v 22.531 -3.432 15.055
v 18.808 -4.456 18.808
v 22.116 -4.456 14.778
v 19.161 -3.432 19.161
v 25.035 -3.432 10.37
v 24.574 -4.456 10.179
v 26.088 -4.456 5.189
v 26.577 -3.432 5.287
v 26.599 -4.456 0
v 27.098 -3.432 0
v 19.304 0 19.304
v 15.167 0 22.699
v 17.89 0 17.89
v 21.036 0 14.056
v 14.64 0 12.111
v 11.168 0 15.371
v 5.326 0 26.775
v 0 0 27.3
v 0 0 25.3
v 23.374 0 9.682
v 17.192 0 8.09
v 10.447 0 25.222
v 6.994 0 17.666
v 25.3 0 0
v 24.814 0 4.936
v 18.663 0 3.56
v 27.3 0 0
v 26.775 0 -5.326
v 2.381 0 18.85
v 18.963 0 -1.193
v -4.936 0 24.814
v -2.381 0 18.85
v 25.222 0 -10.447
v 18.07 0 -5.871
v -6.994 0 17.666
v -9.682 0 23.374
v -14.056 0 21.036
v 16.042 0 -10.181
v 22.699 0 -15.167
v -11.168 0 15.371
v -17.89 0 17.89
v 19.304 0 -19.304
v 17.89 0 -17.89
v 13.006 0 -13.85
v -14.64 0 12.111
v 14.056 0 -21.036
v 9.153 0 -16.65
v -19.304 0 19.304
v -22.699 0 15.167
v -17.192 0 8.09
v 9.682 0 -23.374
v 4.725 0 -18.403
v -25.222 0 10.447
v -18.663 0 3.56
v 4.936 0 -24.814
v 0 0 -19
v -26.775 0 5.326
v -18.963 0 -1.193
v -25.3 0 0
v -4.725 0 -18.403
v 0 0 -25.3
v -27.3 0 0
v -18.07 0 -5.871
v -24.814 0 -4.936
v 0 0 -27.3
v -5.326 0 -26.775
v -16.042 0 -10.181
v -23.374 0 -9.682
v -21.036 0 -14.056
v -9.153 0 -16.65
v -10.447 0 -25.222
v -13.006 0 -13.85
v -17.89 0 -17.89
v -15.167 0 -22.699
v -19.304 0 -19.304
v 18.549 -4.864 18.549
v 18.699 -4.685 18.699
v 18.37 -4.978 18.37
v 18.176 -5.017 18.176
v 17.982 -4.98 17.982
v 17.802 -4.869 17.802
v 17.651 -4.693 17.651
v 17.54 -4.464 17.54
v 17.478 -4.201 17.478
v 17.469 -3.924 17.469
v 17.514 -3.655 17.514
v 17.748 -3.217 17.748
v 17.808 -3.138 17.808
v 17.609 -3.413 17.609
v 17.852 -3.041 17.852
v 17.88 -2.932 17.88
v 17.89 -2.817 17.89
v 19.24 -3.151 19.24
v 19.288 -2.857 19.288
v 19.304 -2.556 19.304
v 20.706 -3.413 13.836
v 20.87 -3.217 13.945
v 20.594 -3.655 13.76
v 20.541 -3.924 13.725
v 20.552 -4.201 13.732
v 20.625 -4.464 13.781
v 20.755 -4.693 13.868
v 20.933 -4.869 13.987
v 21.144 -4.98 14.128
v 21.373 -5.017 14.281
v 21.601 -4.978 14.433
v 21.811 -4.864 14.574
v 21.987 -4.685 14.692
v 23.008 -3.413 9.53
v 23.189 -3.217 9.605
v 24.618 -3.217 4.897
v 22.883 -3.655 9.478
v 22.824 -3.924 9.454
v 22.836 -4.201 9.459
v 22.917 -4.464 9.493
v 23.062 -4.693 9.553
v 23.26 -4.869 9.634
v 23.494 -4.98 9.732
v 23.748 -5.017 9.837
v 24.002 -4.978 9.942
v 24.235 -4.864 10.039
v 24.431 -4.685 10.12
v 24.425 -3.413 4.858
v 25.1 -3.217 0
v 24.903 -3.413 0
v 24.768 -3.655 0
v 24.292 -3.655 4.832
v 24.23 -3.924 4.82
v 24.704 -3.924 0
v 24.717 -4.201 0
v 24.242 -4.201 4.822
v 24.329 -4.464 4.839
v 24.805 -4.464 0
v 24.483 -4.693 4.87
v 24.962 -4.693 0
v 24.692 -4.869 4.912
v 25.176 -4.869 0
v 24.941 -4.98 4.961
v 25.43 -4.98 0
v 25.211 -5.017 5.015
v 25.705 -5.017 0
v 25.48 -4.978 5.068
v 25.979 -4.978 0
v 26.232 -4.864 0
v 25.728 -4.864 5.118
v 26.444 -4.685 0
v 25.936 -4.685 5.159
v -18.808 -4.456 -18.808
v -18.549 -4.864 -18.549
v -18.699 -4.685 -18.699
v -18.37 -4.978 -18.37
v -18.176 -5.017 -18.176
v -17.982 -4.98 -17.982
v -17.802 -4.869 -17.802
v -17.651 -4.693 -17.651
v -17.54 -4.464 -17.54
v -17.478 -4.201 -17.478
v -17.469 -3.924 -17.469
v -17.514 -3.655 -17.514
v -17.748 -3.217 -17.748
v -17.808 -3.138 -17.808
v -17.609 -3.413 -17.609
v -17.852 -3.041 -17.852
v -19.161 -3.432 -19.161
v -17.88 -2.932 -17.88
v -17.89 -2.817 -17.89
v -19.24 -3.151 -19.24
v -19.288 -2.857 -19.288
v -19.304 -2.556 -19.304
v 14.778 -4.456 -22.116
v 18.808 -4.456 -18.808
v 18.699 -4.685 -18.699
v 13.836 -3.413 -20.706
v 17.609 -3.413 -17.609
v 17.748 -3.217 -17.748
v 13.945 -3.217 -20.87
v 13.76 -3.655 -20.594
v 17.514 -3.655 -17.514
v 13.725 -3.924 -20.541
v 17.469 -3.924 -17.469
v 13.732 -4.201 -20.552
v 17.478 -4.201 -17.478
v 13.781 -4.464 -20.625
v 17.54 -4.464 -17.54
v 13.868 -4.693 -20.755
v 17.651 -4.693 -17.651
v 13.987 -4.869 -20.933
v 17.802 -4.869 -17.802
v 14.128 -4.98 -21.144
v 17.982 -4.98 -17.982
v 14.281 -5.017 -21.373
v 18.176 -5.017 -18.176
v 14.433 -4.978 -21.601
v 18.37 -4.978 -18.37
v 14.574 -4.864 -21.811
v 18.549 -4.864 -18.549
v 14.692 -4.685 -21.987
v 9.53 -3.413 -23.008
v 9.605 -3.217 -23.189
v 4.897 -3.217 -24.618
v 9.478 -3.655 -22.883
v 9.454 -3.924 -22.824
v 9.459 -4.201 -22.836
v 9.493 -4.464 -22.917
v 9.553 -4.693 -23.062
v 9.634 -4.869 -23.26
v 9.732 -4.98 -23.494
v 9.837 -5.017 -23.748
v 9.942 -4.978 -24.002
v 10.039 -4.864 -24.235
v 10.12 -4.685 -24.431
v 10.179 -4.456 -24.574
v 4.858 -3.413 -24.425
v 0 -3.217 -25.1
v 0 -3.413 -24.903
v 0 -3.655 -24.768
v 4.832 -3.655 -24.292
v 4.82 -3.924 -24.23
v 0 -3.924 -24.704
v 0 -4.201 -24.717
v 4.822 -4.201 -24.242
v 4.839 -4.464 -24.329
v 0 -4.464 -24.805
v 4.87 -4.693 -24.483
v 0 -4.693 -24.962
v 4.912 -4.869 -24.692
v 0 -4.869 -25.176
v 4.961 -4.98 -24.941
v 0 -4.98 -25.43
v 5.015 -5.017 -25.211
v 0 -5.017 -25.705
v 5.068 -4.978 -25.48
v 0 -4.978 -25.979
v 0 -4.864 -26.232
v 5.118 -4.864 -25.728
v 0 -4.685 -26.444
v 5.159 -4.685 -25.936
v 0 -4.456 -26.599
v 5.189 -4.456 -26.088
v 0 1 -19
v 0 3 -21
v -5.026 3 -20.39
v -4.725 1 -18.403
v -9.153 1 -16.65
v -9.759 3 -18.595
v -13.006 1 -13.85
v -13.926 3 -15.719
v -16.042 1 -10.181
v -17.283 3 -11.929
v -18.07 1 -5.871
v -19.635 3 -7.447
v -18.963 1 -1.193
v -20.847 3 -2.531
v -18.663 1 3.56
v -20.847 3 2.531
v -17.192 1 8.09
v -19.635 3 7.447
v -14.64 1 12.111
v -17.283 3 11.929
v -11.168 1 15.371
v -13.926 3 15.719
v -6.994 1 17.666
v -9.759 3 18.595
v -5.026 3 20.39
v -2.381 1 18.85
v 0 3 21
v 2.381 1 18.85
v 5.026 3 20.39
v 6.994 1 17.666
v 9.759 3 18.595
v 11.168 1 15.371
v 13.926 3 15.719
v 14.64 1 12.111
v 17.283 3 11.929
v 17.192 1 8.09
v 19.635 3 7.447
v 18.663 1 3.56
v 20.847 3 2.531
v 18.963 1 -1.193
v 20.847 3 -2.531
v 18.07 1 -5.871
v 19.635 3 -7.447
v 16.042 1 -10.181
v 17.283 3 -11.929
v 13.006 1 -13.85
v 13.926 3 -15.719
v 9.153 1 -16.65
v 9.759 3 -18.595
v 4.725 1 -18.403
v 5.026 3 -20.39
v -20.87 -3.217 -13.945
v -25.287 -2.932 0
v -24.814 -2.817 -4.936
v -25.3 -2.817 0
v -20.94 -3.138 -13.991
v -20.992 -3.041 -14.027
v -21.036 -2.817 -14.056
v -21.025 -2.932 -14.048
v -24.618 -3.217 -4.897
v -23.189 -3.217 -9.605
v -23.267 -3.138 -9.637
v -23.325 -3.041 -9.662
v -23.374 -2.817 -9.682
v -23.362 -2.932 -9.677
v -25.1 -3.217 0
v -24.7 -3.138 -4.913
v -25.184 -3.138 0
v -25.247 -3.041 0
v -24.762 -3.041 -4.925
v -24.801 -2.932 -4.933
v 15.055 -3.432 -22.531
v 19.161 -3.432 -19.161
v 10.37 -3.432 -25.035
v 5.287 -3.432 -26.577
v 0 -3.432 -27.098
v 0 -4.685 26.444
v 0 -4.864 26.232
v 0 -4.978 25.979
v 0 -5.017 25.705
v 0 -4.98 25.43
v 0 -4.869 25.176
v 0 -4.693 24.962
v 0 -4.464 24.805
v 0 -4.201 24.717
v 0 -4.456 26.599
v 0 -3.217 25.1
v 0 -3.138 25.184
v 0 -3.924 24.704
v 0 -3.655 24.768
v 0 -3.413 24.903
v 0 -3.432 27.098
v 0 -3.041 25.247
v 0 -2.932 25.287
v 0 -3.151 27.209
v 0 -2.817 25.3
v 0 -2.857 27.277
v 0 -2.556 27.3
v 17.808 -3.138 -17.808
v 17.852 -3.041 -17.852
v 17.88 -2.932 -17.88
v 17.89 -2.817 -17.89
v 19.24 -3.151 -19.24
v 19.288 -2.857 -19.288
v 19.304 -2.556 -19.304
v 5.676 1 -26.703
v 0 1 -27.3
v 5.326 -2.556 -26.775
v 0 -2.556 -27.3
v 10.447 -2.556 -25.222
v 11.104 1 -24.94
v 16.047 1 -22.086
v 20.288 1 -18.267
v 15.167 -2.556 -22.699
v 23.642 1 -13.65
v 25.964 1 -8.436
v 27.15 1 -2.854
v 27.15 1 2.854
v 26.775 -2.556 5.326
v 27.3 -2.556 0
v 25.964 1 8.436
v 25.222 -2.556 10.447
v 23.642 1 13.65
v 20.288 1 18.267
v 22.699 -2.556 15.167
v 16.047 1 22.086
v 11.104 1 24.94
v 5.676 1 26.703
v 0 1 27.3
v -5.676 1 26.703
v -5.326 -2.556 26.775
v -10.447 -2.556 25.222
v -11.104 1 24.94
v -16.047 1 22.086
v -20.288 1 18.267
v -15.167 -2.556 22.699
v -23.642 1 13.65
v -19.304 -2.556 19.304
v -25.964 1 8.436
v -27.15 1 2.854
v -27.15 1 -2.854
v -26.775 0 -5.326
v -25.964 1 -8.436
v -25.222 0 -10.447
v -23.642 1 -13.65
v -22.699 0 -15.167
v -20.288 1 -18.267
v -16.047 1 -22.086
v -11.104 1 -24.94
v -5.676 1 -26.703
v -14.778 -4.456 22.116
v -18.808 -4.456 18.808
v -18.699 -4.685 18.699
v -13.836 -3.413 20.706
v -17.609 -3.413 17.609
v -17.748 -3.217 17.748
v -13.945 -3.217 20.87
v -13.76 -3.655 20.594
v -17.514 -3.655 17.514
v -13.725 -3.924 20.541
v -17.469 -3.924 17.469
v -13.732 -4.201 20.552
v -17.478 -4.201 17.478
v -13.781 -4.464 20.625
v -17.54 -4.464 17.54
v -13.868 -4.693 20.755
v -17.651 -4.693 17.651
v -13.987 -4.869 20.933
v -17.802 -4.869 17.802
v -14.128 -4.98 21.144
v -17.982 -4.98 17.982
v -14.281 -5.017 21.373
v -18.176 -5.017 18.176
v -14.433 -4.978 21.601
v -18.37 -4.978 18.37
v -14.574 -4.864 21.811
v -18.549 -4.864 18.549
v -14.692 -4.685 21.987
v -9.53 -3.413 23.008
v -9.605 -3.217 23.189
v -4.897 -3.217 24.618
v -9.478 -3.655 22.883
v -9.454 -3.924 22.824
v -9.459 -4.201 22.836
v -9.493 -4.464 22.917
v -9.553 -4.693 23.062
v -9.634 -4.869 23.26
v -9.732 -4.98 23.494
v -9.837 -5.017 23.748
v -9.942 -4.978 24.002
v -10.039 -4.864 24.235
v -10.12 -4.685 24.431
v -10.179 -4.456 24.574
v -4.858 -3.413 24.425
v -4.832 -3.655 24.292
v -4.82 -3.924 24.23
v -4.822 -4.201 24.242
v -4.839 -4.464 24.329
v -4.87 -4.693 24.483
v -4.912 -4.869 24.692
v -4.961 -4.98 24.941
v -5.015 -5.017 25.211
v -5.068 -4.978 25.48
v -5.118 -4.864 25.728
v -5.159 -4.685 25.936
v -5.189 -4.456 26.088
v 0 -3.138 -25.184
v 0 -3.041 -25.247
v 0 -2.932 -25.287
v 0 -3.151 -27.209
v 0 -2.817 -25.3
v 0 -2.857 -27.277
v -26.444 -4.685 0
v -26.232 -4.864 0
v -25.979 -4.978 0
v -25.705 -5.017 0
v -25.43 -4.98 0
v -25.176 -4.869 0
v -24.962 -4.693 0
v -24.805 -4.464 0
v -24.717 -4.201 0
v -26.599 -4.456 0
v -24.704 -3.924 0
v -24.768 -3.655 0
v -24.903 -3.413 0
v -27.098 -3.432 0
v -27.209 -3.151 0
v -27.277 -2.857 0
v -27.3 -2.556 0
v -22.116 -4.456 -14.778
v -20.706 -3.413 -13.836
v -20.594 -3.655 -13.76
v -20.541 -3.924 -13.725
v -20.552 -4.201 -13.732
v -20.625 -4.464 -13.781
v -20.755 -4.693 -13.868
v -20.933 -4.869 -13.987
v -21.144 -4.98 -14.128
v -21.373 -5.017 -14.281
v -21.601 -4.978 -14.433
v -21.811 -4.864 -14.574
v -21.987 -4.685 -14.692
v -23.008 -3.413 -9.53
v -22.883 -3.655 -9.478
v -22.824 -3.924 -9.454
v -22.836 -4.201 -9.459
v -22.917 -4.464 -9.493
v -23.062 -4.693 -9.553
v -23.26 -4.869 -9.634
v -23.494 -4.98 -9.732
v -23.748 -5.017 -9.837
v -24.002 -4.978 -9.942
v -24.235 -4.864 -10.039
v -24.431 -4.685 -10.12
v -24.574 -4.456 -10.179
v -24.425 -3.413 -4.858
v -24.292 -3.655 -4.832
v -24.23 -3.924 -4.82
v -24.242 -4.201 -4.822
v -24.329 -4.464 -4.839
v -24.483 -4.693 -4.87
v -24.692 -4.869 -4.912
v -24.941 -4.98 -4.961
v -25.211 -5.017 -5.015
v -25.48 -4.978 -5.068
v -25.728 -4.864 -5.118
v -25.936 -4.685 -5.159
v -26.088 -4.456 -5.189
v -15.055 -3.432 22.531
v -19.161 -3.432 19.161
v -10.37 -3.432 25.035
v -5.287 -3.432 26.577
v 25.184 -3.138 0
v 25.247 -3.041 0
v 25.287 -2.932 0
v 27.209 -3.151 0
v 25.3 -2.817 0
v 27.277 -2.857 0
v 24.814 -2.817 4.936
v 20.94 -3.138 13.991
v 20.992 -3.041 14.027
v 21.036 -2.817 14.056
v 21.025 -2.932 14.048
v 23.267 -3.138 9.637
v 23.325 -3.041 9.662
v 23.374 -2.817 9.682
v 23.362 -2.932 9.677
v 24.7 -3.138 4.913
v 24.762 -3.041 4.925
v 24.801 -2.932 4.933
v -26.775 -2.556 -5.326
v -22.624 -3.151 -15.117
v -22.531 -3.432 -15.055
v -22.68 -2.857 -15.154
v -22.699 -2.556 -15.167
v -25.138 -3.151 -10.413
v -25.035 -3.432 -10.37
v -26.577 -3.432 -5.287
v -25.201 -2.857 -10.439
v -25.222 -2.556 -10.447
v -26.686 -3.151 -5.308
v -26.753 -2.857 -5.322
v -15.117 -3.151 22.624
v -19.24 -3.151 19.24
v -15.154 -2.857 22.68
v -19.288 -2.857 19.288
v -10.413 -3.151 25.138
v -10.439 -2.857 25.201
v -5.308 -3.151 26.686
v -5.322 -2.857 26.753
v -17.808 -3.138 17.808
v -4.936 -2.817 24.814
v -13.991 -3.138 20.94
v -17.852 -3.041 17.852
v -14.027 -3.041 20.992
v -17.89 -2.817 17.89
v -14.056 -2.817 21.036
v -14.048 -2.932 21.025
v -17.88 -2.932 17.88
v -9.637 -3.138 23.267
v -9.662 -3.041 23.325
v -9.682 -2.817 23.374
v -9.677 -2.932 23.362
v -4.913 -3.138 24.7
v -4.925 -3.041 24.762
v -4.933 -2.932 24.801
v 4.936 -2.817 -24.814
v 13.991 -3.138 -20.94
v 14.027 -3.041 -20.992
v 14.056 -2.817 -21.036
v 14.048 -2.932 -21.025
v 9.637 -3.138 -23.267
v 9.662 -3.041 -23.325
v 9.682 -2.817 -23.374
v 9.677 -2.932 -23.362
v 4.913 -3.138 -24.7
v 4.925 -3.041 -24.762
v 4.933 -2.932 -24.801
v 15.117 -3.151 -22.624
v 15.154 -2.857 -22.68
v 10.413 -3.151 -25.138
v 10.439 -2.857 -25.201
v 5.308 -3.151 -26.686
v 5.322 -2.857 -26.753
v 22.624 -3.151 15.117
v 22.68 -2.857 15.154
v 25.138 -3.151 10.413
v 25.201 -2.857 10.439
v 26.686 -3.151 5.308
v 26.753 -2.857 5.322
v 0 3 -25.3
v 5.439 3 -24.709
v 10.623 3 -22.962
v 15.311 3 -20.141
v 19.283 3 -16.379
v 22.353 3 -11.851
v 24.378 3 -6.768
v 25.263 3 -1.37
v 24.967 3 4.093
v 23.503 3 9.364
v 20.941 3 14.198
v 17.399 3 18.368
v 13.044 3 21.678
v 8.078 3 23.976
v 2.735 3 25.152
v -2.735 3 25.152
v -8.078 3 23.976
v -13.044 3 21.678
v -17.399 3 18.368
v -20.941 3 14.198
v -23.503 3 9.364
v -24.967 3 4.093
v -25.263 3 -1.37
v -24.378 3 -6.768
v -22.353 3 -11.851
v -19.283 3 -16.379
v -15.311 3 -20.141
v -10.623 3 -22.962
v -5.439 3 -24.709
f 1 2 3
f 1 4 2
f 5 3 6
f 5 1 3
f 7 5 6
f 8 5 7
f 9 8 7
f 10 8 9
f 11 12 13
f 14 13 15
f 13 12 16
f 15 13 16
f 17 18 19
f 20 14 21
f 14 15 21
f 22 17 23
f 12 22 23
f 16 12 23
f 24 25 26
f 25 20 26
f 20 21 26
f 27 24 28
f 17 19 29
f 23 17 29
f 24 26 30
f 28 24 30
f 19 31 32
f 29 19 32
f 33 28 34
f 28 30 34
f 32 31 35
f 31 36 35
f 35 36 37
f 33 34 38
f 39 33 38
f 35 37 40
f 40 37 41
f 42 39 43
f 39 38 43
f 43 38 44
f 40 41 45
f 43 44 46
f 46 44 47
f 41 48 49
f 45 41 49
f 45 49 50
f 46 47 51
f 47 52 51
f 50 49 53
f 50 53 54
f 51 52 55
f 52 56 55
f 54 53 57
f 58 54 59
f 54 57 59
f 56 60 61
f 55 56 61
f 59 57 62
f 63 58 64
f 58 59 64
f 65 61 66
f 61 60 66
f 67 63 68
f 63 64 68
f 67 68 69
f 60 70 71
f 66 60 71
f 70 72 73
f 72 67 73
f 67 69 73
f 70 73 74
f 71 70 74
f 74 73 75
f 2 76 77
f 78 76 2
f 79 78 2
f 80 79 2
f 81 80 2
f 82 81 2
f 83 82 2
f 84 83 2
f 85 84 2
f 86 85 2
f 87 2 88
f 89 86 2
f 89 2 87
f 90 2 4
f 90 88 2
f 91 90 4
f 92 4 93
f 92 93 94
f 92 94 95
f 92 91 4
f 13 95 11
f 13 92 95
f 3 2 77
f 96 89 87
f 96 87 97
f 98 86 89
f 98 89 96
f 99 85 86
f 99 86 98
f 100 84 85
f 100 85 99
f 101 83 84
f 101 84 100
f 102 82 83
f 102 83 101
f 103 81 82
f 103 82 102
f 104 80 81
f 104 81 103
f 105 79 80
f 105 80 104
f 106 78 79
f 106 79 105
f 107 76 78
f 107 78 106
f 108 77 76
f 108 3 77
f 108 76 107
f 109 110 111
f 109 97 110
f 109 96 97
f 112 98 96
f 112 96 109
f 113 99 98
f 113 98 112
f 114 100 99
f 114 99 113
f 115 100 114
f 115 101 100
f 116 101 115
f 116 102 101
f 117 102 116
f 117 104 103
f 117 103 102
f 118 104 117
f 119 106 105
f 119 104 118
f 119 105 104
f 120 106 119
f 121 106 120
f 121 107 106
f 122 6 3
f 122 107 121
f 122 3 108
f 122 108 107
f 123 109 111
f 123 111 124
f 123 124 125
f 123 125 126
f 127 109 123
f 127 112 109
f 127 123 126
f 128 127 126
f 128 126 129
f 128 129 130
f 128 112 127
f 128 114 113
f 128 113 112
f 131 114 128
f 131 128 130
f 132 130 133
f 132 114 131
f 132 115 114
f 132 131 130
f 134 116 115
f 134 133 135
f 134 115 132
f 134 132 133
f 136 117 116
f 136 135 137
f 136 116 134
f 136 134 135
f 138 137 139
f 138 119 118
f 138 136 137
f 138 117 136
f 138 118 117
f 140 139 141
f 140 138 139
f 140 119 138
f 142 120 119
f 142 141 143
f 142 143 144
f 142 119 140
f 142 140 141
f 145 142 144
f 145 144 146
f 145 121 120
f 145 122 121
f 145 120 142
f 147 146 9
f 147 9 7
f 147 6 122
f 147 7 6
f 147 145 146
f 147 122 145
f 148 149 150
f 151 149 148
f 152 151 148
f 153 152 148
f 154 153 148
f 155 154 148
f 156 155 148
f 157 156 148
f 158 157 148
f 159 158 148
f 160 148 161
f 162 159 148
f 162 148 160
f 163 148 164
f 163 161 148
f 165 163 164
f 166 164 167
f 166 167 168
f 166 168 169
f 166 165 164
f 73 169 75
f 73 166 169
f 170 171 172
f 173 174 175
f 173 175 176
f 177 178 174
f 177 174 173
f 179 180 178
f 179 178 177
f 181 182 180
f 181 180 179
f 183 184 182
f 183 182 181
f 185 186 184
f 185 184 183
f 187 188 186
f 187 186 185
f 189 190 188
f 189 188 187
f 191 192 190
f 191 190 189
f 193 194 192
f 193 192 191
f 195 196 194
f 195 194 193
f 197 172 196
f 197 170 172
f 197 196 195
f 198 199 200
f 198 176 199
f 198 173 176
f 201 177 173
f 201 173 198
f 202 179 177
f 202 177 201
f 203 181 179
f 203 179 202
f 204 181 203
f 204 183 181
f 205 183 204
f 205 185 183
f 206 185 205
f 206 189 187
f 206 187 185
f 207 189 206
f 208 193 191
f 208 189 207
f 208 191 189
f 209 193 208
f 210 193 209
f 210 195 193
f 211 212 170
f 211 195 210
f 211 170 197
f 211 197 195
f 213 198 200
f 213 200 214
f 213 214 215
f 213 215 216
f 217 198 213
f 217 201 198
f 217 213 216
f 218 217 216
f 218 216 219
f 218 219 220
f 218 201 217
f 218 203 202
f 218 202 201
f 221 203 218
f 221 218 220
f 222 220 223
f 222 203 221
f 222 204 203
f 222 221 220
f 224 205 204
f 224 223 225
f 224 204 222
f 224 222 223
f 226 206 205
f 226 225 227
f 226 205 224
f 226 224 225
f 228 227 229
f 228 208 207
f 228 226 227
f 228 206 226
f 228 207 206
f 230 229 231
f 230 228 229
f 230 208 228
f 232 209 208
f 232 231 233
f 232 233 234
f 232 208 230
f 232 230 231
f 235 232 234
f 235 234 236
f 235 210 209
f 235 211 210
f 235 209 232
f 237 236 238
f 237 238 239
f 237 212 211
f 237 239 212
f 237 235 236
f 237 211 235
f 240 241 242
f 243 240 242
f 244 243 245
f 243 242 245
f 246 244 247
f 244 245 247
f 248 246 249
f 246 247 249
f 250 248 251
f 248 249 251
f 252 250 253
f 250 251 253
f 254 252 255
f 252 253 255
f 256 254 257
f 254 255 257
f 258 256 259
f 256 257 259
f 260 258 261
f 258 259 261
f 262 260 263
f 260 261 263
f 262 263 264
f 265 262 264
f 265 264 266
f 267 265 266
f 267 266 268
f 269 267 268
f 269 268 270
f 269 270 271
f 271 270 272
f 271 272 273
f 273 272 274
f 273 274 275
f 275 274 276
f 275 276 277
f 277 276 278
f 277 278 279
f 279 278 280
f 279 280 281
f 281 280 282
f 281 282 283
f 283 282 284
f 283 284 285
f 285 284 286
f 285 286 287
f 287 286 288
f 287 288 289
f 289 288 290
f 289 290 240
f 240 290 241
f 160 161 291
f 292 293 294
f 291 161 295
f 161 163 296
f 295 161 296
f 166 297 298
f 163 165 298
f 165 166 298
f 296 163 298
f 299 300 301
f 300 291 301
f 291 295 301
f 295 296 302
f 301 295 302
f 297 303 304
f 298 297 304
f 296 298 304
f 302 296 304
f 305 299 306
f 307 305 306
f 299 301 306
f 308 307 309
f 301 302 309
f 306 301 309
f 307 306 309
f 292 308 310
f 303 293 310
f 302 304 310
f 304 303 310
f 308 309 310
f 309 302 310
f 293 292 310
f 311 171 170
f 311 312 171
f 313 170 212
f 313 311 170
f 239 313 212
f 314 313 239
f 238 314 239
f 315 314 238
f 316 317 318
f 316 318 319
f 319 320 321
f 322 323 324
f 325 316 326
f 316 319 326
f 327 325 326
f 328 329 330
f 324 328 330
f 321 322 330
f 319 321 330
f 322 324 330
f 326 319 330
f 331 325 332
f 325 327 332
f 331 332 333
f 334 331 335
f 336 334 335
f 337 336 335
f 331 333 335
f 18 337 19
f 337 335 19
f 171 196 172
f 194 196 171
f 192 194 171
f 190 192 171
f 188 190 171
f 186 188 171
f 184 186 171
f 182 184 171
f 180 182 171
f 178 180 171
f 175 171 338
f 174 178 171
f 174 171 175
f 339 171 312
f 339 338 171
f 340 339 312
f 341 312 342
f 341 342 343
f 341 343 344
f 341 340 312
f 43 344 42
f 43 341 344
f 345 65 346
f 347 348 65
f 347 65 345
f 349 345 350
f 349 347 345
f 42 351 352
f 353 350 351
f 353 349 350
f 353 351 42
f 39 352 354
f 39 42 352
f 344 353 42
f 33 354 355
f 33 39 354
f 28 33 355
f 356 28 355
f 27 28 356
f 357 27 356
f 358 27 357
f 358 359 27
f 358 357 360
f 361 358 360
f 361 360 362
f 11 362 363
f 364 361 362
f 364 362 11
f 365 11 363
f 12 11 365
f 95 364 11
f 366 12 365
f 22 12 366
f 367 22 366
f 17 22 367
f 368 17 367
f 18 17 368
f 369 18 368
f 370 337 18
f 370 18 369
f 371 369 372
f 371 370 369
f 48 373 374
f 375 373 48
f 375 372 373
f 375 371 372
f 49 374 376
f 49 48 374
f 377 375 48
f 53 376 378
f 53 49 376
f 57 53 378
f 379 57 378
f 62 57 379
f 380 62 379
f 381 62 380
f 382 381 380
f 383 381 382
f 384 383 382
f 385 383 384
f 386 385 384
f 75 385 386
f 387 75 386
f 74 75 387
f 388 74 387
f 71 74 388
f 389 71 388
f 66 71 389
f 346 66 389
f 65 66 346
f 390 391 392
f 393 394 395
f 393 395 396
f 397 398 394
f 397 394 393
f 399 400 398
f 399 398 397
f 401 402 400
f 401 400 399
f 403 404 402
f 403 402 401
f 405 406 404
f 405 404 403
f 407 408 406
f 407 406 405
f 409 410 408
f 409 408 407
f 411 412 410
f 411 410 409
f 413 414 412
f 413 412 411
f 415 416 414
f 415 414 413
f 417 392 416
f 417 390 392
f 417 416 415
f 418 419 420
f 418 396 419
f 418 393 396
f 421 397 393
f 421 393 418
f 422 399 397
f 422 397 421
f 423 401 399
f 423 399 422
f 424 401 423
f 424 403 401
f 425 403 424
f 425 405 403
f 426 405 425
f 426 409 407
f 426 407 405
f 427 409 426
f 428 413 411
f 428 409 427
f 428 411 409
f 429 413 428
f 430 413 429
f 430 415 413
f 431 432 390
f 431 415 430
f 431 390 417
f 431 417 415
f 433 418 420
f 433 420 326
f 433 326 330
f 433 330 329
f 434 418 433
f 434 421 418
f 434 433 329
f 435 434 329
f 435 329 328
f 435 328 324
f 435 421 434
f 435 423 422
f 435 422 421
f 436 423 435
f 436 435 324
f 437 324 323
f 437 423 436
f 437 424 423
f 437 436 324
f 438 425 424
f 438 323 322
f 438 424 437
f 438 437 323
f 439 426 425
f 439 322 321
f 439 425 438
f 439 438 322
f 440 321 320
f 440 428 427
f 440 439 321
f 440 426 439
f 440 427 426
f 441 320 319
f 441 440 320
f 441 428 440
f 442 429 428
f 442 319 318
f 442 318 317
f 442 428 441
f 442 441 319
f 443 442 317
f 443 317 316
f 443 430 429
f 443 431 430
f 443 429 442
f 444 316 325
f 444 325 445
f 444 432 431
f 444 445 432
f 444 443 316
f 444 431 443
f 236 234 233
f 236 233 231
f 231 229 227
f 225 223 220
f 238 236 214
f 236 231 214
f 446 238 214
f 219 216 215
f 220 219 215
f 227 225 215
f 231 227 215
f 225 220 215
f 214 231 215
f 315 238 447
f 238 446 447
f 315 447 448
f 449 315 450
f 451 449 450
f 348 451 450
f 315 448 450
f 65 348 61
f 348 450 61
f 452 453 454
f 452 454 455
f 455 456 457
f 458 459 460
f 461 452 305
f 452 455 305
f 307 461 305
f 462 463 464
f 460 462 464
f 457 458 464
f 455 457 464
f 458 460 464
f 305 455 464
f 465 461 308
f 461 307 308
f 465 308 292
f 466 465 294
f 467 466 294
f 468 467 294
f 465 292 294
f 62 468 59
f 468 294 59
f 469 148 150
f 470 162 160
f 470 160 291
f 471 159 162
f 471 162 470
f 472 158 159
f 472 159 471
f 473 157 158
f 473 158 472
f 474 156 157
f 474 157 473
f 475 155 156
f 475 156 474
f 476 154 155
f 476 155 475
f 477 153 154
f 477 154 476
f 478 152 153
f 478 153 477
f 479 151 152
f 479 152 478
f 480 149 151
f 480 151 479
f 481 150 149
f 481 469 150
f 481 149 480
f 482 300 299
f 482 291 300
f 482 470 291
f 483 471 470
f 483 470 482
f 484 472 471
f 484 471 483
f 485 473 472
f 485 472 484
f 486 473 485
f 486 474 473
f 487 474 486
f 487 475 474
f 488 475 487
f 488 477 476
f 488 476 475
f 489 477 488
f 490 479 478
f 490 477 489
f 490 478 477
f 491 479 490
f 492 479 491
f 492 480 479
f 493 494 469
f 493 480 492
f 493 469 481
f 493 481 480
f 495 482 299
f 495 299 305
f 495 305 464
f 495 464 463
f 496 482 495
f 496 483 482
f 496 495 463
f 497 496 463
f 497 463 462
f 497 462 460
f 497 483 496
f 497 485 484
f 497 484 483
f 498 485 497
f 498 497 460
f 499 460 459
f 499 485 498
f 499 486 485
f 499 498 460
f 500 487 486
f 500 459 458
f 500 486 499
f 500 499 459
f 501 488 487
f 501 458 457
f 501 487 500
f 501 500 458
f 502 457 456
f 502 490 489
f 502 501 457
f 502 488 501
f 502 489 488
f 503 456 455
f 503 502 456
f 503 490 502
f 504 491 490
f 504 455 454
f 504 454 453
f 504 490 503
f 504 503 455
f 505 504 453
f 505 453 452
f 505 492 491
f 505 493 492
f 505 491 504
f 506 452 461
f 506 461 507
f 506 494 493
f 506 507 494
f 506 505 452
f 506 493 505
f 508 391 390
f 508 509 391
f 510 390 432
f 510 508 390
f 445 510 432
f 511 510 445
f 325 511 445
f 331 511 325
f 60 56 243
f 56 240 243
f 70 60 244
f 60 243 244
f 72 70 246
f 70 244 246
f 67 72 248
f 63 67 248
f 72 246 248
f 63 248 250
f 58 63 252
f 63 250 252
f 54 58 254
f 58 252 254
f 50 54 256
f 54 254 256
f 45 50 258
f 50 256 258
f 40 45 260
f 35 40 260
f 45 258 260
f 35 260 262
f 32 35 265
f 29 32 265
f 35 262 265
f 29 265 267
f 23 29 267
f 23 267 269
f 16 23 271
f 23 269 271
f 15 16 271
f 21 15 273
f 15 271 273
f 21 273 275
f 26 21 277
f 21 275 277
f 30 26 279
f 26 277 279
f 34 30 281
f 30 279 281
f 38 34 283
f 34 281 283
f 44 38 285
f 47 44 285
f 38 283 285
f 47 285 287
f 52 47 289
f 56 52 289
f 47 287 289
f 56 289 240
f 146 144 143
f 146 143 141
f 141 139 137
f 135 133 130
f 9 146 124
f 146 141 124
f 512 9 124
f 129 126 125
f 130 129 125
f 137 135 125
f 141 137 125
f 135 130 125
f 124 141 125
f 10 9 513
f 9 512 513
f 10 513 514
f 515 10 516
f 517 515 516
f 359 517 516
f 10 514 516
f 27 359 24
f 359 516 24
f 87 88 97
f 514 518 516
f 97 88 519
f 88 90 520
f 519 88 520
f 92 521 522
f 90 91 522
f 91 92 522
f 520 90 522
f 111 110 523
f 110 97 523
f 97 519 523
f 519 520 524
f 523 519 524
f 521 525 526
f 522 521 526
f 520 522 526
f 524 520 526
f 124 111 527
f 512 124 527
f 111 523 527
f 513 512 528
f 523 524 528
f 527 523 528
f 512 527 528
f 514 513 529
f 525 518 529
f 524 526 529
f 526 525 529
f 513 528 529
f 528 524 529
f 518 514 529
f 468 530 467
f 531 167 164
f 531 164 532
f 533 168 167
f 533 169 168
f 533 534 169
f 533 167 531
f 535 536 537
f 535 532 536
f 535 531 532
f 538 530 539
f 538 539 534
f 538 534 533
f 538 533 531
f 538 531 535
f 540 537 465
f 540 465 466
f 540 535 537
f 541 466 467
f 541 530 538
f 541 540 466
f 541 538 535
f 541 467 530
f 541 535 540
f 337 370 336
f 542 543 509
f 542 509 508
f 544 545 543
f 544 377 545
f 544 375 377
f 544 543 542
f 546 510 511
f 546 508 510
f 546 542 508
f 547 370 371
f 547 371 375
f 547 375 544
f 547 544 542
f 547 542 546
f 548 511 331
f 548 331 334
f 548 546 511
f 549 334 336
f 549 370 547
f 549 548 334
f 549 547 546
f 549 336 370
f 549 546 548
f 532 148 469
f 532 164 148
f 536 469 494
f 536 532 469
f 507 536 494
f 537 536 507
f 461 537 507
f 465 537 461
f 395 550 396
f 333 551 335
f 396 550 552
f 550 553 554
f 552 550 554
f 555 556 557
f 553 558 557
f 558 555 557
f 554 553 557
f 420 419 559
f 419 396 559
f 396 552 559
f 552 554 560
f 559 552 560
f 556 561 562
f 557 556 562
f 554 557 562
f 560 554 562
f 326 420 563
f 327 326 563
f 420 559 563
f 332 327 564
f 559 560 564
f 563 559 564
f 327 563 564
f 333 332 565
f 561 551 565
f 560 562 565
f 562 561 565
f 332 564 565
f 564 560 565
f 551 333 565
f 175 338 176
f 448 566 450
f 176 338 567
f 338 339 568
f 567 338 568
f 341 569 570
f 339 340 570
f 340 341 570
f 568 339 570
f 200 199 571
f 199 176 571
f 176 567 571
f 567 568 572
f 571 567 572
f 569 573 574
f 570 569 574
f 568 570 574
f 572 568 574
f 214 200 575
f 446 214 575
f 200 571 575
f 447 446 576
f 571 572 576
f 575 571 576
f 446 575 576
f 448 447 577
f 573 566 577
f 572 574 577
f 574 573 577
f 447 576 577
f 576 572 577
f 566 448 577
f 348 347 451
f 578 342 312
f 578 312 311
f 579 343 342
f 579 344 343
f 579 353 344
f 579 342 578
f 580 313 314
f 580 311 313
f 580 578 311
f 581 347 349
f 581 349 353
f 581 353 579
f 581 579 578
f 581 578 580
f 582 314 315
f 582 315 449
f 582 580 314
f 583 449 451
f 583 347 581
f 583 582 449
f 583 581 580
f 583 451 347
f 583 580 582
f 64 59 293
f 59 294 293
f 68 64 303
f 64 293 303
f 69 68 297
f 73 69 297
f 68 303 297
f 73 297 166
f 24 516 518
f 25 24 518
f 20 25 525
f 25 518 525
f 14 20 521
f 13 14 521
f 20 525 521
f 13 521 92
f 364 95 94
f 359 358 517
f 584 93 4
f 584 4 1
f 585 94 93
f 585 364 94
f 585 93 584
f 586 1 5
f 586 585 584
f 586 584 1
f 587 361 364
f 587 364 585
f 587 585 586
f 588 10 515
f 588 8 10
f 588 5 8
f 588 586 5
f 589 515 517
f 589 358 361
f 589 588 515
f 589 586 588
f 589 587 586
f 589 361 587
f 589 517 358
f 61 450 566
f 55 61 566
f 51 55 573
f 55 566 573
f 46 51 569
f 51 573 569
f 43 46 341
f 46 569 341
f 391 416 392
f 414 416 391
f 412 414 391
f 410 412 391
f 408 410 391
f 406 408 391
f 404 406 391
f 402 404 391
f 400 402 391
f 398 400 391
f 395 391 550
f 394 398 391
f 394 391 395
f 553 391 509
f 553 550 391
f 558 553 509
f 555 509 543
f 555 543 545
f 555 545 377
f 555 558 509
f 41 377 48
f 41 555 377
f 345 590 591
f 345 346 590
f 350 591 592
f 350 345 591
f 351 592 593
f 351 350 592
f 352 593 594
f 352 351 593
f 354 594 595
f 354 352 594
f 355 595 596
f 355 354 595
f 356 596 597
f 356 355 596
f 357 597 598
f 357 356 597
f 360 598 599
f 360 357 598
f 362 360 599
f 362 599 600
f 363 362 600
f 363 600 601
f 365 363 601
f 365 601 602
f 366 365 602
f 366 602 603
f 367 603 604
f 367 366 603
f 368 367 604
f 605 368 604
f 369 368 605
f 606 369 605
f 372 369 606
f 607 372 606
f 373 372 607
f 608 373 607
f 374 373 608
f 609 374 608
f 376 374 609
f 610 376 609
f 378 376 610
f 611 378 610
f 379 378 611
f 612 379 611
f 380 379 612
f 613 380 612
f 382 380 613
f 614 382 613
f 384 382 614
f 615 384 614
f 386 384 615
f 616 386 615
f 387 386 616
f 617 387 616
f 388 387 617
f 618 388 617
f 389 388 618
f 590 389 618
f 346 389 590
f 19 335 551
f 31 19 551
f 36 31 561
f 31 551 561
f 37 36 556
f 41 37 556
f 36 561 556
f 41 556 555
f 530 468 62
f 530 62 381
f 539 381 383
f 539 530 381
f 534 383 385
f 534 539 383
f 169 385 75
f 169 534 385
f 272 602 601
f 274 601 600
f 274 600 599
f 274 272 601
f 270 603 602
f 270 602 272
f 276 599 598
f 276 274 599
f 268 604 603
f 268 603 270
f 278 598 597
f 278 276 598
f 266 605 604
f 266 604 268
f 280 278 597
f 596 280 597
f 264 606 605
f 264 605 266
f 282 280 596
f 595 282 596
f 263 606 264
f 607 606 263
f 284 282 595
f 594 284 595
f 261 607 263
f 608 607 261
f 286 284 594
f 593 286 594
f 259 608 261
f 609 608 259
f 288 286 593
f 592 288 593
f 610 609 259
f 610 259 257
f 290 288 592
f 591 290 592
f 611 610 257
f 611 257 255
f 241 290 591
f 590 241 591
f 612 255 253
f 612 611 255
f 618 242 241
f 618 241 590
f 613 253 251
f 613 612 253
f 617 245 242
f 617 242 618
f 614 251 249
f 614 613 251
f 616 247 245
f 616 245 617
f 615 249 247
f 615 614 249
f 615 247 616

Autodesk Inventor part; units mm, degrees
ref_plane "YZ Plane" through (0, 0, 0) normal (1, 0, 0) x (0, 1, 0)
ref_plane "XZ Plane" through (0, 0, 0) normal (0, 1, 0) x (-1, 0, 0)
ref_plane "XY Plane" through (0, 0, 0) normal (0, 0, 1) x (1, 0, 0)
sketch "Эскиз1" plane through (0, 0, 0) normal (1, 0, 0) x (0, 1, 0)
  line L0 (0, 0) -> (10.522, 0) construction
  line L1 (0, 0) -> (0, -19) construction
  line L2 (0, 0) -> (0, -27.3) construction
  line L3 (0, -19) -> (3, -19)
  line L4 (3, -19) -> (3, -27.3)
  line L5 (3, -27.3) -> (0, -27.3)
  line L6 (0, -27.3) -> (0, -19)
  dimension "d0" = 19
  dimension "d1" = 27.3
  dimension "d2" = 3
revolve "Вращение1" add sketch "Эскиз1" angle 360 about axis through (0, 0, 0) along (0, 1, 0)
chamfer "Фаска1" distance 2 angle 45 1 edges at (0, 3, 19) measured on face at (2.1778, 3, -24.2689)
chamfer "Фаска2" distance 2 angle 45 1 edges at (0, 3, 27.3) measured on face at (3.853, 3, -24.7322)
sketch "Эскиз2" plane through (0, 0, 0) normal (1, 0, 0) x (0, 1, 0)
  line L0 (0, 0) -> (7.8289, 0) construction
  line L1 (0, 0) -> (0, -24.8) construction
  line L2 (0, 27.3) -> (0, -27.3) construction
  line L3 (0, -25.3) -> (-2.8173, -25.3)
  line L4 (0, -27.3) -> (-2.5558, -27.3)
  line L5 (-3.0173, -25.3) -> (-3.0173, -26.7) construction
  line L6 (0, -25.3) -> (0, -27.3)
  line L7 (-4.0346, 0.25) -> (-4.0346, -25) construction
  line L8 (-4.0346, -25) -> (-6, -25) construction
  arc A0 (-3.2173, -25.1) -> (-4.4555, -26.5989) centre (-4.0173, -25.7) ccw
  line L9 (-5.0173, -25) -> (-5.0173, 0) construction
  line L10 (-4.0346, -24.7) -> (-5.0173, -24.7) construction
  line L11 (-3.0173, -25.3) -> (-3.1008, -25.3) construction
  arc A1 (-3.0173, -25.7) -> (-3.1008, -25.3) centre (-4.0173, -25.7) ccw construction
  arc A2 (-3.2173, -25.1) -> (-2.8173, -25.3) centre (-2.8173, -24.8) ccw
  line L12 (-3.4322, -27.0978) -> (-4.4555, -26.5989)
  arc A3 (-4.4555, -26.5989) -> (-3.0173, -25.7) centre (-4.0173, -25.7) ccw construction
  arc A4 (-3.4322, -27.0978) -> (-2.5558, -27.3) centre (-2.5558, -25.3) ccw
  point P0 (-3.3032, -25)
  point P1 (-3.0173, -27.3)
  dimension "d10" = 24.8
  dimension "d11" = 3.017
  dimension "d12" = 0.5
  dimension "d14" = 4.035
  dimension "d15" = 2
  dimension "d16" = 0.983
  dimension "d17" = 0.3
  dimension "d18" = 0.5
  dimension "d19" = 50
  dimension "d21" = 3.017
  dimension "d22" = 2
revolve "Вращение2" add sketch "Эскиз2" angle 45 about axis through (0, 0, 0) along (0, -1, 0)
pattern_circular "Круговой массив1" count 4 over 360 about axis through (0, 1.5, 0) along (0, -1, 0) of "Вращение2"
properties part number "mirror_lock_v3"
